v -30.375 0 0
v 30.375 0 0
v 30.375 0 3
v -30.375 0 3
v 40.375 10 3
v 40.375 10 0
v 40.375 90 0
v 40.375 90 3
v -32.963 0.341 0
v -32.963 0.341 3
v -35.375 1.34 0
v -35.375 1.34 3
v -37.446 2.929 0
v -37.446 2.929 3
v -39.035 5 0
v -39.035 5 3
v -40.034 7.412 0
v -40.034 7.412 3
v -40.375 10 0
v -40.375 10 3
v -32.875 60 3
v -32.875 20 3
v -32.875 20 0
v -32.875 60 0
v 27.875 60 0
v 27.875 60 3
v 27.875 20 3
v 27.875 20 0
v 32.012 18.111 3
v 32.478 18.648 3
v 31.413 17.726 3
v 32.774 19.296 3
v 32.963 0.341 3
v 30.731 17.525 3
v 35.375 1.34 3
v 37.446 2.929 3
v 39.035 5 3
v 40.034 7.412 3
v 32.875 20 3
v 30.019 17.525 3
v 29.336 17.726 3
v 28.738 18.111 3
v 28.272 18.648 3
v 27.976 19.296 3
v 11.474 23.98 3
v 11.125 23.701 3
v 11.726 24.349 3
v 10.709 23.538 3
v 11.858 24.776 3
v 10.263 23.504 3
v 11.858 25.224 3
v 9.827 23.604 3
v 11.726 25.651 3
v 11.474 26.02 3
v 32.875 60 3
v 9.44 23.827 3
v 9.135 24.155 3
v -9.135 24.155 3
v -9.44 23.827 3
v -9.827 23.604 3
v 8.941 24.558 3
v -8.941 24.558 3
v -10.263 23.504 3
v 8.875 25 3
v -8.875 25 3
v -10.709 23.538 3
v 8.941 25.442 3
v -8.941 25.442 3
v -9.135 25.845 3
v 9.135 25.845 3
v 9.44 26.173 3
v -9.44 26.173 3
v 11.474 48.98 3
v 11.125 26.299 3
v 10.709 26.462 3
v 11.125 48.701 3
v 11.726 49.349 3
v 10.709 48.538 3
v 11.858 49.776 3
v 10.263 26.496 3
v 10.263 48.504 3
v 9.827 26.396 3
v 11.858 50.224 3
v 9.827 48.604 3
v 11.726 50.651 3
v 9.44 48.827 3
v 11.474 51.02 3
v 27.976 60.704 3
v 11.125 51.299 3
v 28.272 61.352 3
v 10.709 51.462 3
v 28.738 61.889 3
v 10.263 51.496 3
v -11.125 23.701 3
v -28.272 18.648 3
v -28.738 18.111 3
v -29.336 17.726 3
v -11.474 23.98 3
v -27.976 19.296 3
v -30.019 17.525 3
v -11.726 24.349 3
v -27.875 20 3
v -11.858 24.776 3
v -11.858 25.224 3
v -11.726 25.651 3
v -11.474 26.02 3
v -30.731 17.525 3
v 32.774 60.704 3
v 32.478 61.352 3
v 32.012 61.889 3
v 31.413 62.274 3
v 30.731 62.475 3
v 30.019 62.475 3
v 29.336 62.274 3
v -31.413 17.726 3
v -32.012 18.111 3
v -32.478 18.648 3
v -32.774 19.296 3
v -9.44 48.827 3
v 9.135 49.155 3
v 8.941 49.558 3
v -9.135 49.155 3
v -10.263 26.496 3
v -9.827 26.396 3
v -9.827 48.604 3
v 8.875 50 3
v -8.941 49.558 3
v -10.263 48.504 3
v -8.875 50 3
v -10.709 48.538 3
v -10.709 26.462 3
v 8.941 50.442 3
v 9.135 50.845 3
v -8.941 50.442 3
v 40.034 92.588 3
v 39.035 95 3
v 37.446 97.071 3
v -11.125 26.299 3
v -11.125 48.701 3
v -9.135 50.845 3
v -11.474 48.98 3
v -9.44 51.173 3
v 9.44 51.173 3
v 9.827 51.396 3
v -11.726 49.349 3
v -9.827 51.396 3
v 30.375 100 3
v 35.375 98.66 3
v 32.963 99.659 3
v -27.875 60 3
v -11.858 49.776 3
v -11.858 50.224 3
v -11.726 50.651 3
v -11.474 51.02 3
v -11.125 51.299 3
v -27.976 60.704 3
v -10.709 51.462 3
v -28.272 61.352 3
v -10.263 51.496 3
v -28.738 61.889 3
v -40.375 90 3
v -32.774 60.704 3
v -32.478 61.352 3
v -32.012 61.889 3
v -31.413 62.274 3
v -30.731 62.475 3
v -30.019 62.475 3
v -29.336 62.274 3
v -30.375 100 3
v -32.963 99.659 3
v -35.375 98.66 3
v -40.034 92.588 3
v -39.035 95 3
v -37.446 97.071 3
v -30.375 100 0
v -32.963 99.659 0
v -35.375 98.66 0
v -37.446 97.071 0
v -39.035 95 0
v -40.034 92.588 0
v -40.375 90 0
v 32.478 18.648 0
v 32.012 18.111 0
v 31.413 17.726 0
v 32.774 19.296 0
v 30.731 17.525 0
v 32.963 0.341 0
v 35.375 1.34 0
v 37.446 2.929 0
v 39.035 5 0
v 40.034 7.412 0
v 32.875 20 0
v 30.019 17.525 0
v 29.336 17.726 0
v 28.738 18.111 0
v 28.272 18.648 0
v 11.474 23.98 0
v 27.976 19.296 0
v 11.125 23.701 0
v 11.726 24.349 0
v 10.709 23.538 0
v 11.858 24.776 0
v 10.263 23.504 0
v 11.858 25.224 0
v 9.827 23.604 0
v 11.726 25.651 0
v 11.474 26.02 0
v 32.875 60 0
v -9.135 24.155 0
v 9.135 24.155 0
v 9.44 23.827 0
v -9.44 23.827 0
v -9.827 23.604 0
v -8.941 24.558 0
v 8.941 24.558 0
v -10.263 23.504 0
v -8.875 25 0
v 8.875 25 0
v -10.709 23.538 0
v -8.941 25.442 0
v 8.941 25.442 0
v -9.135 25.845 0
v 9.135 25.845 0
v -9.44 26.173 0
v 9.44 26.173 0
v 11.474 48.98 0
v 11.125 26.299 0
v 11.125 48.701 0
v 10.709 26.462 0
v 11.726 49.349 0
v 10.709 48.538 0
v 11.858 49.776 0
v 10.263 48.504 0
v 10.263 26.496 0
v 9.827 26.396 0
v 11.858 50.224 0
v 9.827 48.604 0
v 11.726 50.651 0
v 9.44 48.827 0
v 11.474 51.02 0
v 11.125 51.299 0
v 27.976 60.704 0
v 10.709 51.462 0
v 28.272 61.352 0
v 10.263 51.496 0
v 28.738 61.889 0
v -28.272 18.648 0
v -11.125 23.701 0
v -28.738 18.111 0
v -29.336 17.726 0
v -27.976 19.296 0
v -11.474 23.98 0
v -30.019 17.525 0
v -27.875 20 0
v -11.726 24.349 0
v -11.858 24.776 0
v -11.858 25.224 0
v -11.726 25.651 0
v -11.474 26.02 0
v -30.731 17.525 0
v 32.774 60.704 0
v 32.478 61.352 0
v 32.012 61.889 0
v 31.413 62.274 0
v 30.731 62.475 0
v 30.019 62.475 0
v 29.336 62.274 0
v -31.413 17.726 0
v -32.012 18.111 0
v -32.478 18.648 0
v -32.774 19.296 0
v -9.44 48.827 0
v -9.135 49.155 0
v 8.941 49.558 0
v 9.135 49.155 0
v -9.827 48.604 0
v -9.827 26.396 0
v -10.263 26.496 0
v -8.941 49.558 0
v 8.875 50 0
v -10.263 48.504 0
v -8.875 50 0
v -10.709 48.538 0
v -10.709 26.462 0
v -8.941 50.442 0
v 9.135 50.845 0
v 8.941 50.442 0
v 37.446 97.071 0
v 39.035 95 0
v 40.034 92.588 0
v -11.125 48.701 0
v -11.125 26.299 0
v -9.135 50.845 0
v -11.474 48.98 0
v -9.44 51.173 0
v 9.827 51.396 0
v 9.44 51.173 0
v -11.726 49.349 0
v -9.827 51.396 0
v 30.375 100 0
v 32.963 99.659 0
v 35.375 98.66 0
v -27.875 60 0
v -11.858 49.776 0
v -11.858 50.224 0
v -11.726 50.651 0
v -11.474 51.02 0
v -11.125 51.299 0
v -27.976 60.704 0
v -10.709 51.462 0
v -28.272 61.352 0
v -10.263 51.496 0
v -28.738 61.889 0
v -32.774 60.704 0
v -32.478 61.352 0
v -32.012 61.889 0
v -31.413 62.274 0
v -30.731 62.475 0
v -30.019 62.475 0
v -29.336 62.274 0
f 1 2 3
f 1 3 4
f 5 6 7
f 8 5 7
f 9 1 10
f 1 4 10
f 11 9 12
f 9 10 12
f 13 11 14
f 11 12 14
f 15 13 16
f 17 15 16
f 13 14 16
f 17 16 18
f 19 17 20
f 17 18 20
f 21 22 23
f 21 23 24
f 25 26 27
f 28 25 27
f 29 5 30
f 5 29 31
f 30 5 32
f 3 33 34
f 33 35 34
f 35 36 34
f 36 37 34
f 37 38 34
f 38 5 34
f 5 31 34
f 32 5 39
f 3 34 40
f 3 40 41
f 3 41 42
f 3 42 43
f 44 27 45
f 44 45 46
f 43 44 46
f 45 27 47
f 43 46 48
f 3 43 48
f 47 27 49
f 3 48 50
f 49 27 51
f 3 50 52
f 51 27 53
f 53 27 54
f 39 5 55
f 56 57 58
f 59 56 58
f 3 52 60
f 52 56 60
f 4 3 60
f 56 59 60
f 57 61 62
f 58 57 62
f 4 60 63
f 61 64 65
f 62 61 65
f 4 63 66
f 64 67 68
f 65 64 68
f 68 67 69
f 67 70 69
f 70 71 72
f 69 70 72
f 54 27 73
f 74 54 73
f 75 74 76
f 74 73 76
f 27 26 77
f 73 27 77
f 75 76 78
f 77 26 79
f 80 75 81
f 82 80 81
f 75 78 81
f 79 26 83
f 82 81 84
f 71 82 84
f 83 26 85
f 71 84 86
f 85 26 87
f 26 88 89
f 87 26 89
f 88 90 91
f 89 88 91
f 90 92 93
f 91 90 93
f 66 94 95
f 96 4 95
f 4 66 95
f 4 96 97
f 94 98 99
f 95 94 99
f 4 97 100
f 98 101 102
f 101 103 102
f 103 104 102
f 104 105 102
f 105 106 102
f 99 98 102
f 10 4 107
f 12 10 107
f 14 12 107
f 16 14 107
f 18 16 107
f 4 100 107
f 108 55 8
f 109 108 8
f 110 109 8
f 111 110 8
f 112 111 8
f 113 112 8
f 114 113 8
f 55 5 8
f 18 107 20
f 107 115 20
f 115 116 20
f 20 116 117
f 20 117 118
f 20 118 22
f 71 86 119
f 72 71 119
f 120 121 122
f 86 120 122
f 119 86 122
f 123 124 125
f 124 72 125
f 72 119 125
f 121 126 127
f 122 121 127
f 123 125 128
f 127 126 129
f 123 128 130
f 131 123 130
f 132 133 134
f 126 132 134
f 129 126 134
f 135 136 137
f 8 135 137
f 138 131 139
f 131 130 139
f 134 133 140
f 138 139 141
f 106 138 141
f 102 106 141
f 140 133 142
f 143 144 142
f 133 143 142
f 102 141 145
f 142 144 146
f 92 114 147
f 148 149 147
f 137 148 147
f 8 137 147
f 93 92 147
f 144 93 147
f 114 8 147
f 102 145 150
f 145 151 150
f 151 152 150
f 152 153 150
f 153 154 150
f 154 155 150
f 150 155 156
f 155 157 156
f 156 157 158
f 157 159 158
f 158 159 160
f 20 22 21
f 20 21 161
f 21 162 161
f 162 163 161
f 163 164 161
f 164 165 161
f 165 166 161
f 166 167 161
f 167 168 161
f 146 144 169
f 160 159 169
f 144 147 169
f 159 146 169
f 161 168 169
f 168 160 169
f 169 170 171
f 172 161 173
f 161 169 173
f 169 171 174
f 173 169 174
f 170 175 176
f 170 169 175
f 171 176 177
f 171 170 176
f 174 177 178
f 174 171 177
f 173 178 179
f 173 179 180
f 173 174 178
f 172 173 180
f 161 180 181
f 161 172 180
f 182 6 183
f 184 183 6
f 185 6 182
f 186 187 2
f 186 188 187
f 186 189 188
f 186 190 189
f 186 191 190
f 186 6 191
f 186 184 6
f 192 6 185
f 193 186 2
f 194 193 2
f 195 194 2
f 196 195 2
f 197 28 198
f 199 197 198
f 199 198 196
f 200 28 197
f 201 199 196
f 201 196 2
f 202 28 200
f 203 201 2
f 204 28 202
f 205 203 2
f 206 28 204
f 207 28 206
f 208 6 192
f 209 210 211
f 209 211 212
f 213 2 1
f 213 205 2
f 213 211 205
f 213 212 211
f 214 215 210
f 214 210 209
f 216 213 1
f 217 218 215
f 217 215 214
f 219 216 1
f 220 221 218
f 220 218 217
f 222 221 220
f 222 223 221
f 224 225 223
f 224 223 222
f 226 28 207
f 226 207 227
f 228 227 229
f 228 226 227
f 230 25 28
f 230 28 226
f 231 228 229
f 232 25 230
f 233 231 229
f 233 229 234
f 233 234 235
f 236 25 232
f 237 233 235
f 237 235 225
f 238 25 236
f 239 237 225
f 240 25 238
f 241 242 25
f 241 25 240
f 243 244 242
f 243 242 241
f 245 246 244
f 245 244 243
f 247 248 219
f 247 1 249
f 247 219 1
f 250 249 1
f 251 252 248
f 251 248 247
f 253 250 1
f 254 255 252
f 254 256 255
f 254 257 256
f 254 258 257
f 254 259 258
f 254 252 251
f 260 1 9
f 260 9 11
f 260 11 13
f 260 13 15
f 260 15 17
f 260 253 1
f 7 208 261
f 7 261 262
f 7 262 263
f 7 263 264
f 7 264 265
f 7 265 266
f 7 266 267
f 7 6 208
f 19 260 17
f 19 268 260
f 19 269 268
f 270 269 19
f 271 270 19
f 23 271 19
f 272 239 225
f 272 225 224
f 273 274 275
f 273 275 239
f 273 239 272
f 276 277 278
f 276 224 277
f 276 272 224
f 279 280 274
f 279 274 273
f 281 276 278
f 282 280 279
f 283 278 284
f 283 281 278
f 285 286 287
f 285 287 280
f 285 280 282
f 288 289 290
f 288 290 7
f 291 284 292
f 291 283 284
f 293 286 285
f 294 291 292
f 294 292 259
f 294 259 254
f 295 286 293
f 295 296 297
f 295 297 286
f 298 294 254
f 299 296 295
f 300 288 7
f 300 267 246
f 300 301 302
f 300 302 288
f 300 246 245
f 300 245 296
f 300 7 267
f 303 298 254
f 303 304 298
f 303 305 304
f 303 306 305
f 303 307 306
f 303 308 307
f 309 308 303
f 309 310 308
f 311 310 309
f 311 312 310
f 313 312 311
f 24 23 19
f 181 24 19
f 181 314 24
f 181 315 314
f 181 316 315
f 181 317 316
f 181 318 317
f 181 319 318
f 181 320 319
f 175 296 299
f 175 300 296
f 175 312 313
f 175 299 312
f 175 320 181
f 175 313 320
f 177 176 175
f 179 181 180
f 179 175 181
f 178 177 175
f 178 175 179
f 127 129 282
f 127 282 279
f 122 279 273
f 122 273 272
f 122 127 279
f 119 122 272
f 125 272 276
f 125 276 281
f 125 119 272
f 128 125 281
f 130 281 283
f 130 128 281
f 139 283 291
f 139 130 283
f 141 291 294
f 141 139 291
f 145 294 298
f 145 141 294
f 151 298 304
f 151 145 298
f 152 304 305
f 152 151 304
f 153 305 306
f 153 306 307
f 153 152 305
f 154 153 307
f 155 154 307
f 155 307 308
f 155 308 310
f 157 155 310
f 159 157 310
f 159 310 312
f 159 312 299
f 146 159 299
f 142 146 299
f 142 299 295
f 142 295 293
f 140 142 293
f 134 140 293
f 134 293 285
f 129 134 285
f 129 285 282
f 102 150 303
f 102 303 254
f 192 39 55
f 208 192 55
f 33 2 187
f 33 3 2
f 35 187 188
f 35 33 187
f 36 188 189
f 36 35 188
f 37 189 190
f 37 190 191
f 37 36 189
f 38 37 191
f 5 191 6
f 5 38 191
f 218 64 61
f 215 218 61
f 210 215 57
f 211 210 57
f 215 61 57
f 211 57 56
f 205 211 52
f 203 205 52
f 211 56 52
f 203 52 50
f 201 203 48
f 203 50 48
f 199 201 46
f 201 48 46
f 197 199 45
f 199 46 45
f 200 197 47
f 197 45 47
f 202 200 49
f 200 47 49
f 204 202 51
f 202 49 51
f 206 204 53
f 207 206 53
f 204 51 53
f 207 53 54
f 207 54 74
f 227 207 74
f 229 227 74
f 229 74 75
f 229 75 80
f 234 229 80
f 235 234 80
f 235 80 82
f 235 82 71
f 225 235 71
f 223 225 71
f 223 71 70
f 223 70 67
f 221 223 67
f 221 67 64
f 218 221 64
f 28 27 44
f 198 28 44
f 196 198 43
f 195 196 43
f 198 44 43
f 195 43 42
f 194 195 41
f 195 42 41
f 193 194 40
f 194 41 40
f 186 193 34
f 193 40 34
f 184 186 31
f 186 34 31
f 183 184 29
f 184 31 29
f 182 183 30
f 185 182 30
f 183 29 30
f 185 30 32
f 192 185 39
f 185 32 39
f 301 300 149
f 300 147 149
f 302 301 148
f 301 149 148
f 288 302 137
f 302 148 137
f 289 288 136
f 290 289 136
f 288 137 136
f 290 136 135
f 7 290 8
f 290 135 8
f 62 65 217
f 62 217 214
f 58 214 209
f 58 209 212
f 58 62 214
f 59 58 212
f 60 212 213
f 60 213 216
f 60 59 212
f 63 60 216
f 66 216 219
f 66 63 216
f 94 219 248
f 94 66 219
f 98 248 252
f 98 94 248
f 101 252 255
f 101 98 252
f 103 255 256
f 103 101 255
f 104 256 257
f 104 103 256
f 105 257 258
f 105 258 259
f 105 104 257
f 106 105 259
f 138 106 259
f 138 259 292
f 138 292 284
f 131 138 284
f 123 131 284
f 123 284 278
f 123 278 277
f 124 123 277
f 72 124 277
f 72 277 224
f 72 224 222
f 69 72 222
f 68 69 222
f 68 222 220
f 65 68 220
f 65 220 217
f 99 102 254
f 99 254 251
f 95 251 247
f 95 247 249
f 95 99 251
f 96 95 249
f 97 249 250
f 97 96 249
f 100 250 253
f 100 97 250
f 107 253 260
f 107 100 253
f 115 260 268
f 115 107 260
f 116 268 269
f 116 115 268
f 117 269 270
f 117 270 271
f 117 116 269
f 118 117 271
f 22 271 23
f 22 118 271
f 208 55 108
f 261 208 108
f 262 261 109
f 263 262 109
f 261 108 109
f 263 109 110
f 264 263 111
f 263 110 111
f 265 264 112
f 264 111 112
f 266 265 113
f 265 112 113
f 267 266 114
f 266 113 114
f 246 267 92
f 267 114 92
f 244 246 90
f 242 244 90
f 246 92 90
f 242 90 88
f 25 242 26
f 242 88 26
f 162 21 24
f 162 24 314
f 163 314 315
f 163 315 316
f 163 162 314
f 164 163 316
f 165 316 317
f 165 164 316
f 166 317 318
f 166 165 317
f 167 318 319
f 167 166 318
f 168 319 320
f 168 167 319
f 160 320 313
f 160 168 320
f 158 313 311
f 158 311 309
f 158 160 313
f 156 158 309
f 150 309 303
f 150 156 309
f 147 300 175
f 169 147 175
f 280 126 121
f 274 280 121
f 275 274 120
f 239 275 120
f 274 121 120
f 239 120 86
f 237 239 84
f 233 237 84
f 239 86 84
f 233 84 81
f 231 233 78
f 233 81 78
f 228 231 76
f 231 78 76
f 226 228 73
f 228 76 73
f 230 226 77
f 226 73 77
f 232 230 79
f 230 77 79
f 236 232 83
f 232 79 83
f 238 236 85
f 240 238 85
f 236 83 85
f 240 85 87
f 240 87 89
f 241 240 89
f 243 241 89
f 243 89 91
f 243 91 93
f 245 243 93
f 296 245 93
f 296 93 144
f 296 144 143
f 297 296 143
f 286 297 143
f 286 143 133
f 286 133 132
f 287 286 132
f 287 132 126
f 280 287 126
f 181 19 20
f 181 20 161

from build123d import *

# Parameters (mm, degrees)
F0_W     = 40.3748353374
F0_H     = 100
F1_DEPTH = 3
F3_D     = 3
F5_R     = 10
F7_DEPTH = 31.1417784542


with BuildPart() as f1:
    # F0 (on Top) → F1 (new body)
    with BuildSketch(Plane.XY):
        with Locations((20.1874176687, 50)):
            Rectangle(F0_W, F0_H)
    extrude(amount=F1_DEPTH)

    # F3 (through all)
    with Locations(Plane(origin=(0, 0, 0), x_dir=(1, 0, 0), z_dir=(0, 0, -1))):
        with Locations((10.3748353374, -25), (10.3748353374, -50)):
            Hole(F3_D / 2)

    # F5
    f5_edges = [f1.edges().sort_by_distance(p)[0] for p in [
        (40.374835, 100, 1.5),
        (40.374835, 0, 1.5),
    ]]
    fillet(f5_edges, radius=F5_R)

    # F6 (on face) → F7 (cut)
    with BuildSketch(Plane.XY.offset(3)):
        with BuildLine():
            ThreePointArc((27.8748353374, 20), (30.3748353374, 17.5), (32.8748353374, 20))
            Line((32.8748353374, 20), (32.8748353374, 60))
            ThreePointArc((32.8748353374, 60), (30.3748353374, 62.5), (27.8748353374, 60))
            Line((27.8748353374, 60), (27.8748353374, 20))
        make_face()
    extrude(amount=-F7_DEPTH, mode=Mode.SUBTRACT)

    # F8: F1 across plane


with BuildPart() as f1_1:
    add(f1.part)
    add(f1.part.mirror(Plane.YZ))


solid = f1_1.part
